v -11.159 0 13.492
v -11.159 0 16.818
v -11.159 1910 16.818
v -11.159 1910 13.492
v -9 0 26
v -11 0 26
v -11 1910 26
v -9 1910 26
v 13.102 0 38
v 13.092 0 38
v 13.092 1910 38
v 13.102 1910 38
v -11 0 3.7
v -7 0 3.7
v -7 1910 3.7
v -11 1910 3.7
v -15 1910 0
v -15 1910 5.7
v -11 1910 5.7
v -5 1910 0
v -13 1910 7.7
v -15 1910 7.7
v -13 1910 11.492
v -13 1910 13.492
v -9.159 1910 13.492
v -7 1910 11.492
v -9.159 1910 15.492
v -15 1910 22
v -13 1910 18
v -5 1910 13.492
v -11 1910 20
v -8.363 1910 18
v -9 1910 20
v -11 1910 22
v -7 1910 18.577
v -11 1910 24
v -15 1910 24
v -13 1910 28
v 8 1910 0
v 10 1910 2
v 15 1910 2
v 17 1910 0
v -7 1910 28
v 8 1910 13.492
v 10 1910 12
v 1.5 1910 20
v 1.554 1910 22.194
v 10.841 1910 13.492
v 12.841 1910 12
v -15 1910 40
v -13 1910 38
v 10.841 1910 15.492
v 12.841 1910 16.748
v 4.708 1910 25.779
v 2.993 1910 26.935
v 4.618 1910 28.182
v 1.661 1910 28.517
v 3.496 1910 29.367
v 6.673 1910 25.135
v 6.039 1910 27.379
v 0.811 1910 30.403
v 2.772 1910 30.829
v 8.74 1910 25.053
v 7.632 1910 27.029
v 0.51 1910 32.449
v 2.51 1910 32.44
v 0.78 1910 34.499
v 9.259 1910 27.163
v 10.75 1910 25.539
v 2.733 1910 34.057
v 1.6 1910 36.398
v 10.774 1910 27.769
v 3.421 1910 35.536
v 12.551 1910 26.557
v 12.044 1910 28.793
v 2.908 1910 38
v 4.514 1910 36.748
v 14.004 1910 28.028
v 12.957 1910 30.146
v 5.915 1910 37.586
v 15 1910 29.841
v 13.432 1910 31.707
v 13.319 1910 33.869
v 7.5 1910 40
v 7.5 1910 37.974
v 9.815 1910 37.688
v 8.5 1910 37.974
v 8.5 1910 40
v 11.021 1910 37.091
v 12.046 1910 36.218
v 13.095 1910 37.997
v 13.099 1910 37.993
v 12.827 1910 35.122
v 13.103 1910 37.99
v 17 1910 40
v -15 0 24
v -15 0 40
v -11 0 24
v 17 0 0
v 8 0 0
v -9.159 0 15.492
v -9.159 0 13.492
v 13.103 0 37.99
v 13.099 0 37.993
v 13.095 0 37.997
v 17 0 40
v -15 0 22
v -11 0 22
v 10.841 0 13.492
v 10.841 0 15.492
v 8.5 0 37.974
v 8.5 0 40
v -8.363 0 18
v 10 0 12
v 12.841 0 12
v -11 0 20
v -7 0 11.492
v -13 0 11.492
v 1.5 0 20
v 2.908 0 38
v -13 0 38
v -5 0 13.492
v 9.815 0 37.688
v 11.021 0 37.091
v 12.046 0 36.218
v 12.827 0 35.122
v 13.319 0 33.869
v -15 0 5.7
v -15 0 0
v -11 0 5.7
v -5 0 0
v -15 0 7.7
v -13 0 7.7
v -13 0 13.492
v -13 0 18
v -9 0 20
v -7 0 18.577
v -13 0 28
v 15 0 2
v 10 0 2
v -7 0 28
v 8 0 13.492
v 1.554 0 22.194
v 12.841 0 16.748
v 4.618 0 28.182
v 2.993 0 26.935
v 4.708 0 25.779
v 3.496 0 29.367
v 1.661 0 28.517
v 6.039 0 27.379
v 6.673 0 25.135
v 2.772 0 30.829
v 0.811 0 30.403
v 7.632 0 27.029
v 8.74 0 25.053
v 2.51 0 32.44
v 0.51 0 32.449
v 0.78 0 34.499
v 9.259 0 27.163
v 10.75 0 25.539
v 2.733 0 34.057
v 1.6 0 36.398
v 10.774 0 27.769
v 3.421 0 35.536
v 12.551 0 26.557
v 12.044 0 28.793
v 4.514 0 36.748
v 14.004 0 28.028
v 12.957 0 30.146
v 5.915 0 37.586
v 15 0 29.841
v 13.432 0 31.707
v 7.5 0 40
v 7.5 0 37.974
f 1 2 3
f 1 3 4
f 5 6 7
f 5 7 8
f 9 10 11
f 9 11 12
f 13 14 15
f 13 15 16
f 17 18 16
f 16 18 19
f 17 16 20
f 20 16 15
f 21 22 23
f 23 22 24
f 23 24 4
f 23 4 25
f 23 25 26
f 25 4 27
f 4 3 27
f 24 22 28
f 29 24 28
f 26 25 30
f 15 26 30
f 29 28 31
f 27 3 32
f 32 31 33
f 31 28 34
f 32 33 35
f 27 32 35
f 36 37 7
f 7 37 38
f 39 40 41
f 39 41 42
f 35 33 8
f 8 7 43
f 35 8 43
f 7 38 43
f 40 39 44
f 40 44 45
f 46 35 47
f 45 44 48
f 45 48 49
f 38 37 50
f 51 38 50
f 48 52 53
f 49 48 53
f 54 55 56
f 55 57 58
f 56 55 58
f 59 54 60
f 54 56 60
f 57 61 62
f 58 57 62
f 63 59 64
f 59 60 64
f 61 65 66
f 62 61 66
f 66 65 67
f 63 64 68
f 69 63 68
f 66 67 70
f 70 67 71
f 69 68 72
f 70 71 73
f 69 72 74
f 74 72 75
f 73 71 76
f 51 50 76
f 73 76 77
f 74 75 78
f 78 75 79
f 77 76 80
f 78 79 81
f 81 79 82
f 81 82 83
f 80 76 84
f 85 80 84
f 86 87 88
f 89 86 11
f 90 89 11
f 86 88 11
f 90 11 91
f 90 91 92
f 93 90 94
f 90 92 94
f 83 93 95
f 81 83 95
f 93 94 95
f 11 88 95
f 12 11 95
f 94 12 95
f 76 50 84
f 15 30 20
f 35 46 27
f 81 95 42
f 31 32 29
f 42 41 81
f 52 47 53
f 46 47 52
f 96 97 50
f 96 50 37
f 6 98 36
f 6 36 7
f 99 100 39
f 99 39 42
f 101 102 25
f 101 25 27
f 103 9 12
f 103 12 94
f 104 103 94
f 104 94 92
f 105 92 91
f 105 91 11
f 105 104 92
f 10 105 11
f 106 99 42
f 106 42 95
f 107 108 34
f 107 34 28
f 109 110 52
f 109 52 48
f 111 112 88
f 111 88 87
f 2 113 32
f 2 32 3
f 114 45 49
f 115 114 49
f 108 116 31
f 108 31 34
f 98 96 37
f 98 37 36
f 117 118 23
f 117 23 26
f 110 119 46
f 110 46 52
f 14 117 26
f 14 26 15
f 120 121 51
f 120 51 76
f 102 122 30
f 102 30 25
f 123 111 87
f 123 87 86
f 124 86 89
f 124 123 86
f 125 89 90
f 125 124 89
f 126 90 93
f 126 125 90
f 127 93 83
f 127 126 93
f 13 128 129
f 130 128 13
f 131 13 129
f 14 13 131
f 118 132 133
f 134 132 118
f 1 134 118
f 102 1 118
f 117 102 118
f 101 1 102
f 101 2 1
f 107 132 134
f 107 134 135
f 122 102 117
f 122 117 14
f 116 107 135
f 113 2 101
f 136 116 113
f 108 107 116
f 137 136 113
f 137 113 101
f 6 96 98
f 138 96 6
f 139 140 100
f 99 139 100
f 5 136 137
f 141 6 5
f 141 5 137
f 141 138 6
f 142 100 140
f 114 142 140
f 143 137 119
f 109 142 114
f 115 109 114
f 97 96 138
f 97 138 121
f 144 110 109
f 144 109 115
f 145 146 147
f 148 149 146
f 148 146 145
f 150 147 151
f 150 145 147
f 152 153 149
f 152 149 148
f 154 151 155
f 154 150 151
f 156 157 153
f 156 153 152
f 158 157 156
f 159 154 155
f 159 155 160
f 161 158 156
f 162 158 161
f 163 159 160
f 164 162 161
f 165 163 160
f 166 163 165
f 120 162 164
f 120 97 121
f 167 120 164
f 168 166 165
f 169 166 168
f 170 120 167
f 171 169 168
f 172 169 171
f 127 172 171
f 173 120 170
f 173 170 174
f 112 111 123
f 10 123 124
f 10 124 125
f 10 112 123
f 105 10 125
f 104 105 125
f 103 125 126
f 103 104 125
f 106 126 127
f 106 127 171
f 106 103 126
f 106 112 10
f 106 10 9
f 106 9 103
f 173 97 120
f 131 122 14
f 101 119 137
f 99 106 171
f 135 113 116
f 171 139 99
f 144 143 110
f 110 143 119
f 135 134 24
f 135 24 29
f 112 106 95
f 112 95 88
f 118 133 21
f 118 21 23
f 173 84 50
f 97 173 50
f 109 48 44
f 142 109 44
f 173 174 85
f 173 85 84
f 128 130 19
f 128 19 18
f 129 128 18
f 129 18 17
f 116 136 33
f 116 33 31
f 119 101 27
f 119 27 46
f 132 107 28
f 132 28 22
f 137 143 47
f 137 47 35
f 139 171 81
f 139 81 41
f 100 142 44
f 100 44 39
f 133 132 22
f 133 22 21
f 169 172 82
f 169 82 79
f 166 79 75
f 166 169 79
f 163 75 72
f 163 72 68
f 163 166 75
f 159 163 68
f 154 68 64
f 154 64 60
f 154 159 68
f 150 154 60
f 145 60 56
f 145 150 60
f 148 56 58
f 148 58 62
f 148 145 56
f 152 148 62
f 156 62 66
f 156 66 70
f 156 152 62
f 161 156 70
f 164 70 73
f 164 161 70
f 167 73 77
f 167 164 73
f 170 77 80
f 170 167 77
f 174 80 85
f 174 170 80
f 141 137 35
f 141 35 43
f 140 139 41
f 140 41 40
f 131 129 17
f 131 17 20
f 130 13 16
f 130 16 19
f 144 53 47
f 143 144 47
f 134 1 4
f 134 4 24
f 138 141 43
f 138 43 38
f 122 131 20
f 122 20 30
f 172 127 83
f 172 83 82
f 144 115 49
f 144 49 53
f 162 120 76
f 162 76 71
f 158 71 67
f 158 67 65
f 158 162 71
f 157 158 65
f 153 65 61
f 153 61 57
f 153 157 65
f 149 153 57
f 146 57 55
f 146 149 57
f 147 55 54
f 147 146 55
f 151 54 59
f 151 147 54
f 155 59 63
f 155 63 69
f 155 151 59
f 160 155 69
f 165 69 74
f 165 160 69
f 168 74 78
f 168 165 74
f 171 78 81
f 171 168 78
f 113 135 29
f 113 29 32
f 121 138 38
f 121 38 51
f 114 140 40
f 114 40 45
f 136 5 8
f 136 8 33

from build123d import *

# Parameters (mm, degrees)
F2_DEPTH = 1910


# Not quite as in the source:
# - a feature of the source that left no trace in its solid (it failed there, or was rolled back) is left out


with BuildPart() as f2:
    # F1 (on Front) → F2 (new body)
    with BuildSketch(Plane.XZ):
        with BuildLine():
            Line((7.5, 37.974085065), (7.5, 40))
            Line((7.5, 40), (-15, 40))
            Line((-15, 40), (-15, 37))
            Line((-15, 37), (-15, 31))
            Line((-15, 31), (-15, 29))
            Line((-15, 29), (-15, 26))
            Line((-15, 26), (-15, 24))
            Line((-15, 24), (-13, 24))
            Line((-13, 24), (-11, 24))
            Line((-11, 24), (-11, 26))
            Line((-11, 26), (-9, 26))
            Line((-9, 26), (-9, 20))
            Line((-9, 20), (-11, 20))
            Line((-11, 20), (-11, 22))
            Line((-11, 22), (-15, 22))
            Line((-15, 22), (-15, 18))
            Line((-15, 18), (-15, 7.7))
            Line((-15, 7.7), (-13, 7.7))
            Line((-13, 7.7), (-13, 11.4920835048))
            Line((-13, 11.4920835048), (-7, 11.4920835048))
            Line((-7, 11.4920835048), (-7, 3.7))
            Line((-7, 3.7), (-11, 3.7))
            Line((-11, 3.7), (-11, 5.7))
            Line((-11, 5.7), (-15, 5.7))
            Line((-15, 5.7), (-15, 3))
            Line((-15, 3), (-15, 0))
            Line((-15, 0), (-13, 0))
            Line((-13, 0), (-12, 0))
            Line((-12, 0), (-5, 0))
            Line((-5, 0), (-5, 13.4920835048))
            Line((-5, 13.4920835048), (-7, 13.4920835048))
            Line((-7, 13.4920835048), (-9.1588944197, 13.4920835048))
            Line((-9.1588944197, 13.4920835048), (-9.1588944197, 15.4920835048))
            Line((-9.1588944197, 15.4920835048), (1.5, 20))
            Line((1.5, 20), (10.8411055803, 15.4920835048))
            Line((10.8411055803, 15.4920835048), (10.8411055803, 13.4920835048))
            Line((10.8411055803, 13.4920835048), (8, 13.4920835048))
            Line((8, 13.4920835048), (8, 0))
            Line((8, 0), (17, 0))
            Line((17, 0), (17, 40))
            Line((17, 40), (8.5, 40))
            Line((8.5, 40), (8.5, 37.974085065))
            ThreePointArc((8.5, 37.974085065), (11.5604089792, 36.6859489396), (13.3185590744, 33.8691589154))
            Line((13.3185590744, 33.8691589154), (13.4318527537, 31.7073867348))
            ThreePointArc((13.4318527537, 31.7073867348), (4.0126863822, 28.7323088758), (7.5, 37.974085065))
        make_face()
        Polygon((-8.3634709733, 18), (-11.1588944197, 16.817744602), (-11.1588944197, 15.4920835048), (-11.1588944197, 13.4920835048), (-13, 13.4920835048), (-13, 18), align=None, mode=Mode.SUBTRACT)
        with BuildLine():
            Line((-13, 34), (-13, 37.9999987781))
            Line((-13, 37.9999987781), (2.9081163149, 37.9999987781))
            ThreePointArc((2.9081163149, 37.9999987781), (3.810445381, 26.2974906682), (15, 29.8410427327))
            Line((15, 29.8410427327), (15, 2))
            Line((15, 2), (10, 2))
            Line((10, 2), (10, 12))
            Line((10, 12), (12.8411055803, 12))
            Line((12.8411055803, 12), (12.8411055803, 16.7476188273))
            Line((12.8411055803, 16.7476188273), (1.5543358685, 22.194491783))
            Line((1.5543358685, 22.194491783), (-7, 18.5766464184))
            Line((-7, 18.5766464184), (-7, 28))
            Line((-7, 28), (-13, 28))
            Line((-13, 28), (-13, 34))
        make_face(mode=Mode.SUBTRACT)
        with BuildLine():
            Line((13.0918836851, 37.9999987781), (13.1020709306, 37.9999987781))
            Line((13.1020709306, 37.9999987781), (13.1025921338, 37.9900536295))
            ThreePointArc((13.1025921338, 37.9900536295), (13.0972403349, 37.9950288154), (13.0918836851, 37.9999987781))
        make_face(mode=Mode.SUBTRACT)
    extrude(amount=-F2_DEPTH)


solid = f2.part
